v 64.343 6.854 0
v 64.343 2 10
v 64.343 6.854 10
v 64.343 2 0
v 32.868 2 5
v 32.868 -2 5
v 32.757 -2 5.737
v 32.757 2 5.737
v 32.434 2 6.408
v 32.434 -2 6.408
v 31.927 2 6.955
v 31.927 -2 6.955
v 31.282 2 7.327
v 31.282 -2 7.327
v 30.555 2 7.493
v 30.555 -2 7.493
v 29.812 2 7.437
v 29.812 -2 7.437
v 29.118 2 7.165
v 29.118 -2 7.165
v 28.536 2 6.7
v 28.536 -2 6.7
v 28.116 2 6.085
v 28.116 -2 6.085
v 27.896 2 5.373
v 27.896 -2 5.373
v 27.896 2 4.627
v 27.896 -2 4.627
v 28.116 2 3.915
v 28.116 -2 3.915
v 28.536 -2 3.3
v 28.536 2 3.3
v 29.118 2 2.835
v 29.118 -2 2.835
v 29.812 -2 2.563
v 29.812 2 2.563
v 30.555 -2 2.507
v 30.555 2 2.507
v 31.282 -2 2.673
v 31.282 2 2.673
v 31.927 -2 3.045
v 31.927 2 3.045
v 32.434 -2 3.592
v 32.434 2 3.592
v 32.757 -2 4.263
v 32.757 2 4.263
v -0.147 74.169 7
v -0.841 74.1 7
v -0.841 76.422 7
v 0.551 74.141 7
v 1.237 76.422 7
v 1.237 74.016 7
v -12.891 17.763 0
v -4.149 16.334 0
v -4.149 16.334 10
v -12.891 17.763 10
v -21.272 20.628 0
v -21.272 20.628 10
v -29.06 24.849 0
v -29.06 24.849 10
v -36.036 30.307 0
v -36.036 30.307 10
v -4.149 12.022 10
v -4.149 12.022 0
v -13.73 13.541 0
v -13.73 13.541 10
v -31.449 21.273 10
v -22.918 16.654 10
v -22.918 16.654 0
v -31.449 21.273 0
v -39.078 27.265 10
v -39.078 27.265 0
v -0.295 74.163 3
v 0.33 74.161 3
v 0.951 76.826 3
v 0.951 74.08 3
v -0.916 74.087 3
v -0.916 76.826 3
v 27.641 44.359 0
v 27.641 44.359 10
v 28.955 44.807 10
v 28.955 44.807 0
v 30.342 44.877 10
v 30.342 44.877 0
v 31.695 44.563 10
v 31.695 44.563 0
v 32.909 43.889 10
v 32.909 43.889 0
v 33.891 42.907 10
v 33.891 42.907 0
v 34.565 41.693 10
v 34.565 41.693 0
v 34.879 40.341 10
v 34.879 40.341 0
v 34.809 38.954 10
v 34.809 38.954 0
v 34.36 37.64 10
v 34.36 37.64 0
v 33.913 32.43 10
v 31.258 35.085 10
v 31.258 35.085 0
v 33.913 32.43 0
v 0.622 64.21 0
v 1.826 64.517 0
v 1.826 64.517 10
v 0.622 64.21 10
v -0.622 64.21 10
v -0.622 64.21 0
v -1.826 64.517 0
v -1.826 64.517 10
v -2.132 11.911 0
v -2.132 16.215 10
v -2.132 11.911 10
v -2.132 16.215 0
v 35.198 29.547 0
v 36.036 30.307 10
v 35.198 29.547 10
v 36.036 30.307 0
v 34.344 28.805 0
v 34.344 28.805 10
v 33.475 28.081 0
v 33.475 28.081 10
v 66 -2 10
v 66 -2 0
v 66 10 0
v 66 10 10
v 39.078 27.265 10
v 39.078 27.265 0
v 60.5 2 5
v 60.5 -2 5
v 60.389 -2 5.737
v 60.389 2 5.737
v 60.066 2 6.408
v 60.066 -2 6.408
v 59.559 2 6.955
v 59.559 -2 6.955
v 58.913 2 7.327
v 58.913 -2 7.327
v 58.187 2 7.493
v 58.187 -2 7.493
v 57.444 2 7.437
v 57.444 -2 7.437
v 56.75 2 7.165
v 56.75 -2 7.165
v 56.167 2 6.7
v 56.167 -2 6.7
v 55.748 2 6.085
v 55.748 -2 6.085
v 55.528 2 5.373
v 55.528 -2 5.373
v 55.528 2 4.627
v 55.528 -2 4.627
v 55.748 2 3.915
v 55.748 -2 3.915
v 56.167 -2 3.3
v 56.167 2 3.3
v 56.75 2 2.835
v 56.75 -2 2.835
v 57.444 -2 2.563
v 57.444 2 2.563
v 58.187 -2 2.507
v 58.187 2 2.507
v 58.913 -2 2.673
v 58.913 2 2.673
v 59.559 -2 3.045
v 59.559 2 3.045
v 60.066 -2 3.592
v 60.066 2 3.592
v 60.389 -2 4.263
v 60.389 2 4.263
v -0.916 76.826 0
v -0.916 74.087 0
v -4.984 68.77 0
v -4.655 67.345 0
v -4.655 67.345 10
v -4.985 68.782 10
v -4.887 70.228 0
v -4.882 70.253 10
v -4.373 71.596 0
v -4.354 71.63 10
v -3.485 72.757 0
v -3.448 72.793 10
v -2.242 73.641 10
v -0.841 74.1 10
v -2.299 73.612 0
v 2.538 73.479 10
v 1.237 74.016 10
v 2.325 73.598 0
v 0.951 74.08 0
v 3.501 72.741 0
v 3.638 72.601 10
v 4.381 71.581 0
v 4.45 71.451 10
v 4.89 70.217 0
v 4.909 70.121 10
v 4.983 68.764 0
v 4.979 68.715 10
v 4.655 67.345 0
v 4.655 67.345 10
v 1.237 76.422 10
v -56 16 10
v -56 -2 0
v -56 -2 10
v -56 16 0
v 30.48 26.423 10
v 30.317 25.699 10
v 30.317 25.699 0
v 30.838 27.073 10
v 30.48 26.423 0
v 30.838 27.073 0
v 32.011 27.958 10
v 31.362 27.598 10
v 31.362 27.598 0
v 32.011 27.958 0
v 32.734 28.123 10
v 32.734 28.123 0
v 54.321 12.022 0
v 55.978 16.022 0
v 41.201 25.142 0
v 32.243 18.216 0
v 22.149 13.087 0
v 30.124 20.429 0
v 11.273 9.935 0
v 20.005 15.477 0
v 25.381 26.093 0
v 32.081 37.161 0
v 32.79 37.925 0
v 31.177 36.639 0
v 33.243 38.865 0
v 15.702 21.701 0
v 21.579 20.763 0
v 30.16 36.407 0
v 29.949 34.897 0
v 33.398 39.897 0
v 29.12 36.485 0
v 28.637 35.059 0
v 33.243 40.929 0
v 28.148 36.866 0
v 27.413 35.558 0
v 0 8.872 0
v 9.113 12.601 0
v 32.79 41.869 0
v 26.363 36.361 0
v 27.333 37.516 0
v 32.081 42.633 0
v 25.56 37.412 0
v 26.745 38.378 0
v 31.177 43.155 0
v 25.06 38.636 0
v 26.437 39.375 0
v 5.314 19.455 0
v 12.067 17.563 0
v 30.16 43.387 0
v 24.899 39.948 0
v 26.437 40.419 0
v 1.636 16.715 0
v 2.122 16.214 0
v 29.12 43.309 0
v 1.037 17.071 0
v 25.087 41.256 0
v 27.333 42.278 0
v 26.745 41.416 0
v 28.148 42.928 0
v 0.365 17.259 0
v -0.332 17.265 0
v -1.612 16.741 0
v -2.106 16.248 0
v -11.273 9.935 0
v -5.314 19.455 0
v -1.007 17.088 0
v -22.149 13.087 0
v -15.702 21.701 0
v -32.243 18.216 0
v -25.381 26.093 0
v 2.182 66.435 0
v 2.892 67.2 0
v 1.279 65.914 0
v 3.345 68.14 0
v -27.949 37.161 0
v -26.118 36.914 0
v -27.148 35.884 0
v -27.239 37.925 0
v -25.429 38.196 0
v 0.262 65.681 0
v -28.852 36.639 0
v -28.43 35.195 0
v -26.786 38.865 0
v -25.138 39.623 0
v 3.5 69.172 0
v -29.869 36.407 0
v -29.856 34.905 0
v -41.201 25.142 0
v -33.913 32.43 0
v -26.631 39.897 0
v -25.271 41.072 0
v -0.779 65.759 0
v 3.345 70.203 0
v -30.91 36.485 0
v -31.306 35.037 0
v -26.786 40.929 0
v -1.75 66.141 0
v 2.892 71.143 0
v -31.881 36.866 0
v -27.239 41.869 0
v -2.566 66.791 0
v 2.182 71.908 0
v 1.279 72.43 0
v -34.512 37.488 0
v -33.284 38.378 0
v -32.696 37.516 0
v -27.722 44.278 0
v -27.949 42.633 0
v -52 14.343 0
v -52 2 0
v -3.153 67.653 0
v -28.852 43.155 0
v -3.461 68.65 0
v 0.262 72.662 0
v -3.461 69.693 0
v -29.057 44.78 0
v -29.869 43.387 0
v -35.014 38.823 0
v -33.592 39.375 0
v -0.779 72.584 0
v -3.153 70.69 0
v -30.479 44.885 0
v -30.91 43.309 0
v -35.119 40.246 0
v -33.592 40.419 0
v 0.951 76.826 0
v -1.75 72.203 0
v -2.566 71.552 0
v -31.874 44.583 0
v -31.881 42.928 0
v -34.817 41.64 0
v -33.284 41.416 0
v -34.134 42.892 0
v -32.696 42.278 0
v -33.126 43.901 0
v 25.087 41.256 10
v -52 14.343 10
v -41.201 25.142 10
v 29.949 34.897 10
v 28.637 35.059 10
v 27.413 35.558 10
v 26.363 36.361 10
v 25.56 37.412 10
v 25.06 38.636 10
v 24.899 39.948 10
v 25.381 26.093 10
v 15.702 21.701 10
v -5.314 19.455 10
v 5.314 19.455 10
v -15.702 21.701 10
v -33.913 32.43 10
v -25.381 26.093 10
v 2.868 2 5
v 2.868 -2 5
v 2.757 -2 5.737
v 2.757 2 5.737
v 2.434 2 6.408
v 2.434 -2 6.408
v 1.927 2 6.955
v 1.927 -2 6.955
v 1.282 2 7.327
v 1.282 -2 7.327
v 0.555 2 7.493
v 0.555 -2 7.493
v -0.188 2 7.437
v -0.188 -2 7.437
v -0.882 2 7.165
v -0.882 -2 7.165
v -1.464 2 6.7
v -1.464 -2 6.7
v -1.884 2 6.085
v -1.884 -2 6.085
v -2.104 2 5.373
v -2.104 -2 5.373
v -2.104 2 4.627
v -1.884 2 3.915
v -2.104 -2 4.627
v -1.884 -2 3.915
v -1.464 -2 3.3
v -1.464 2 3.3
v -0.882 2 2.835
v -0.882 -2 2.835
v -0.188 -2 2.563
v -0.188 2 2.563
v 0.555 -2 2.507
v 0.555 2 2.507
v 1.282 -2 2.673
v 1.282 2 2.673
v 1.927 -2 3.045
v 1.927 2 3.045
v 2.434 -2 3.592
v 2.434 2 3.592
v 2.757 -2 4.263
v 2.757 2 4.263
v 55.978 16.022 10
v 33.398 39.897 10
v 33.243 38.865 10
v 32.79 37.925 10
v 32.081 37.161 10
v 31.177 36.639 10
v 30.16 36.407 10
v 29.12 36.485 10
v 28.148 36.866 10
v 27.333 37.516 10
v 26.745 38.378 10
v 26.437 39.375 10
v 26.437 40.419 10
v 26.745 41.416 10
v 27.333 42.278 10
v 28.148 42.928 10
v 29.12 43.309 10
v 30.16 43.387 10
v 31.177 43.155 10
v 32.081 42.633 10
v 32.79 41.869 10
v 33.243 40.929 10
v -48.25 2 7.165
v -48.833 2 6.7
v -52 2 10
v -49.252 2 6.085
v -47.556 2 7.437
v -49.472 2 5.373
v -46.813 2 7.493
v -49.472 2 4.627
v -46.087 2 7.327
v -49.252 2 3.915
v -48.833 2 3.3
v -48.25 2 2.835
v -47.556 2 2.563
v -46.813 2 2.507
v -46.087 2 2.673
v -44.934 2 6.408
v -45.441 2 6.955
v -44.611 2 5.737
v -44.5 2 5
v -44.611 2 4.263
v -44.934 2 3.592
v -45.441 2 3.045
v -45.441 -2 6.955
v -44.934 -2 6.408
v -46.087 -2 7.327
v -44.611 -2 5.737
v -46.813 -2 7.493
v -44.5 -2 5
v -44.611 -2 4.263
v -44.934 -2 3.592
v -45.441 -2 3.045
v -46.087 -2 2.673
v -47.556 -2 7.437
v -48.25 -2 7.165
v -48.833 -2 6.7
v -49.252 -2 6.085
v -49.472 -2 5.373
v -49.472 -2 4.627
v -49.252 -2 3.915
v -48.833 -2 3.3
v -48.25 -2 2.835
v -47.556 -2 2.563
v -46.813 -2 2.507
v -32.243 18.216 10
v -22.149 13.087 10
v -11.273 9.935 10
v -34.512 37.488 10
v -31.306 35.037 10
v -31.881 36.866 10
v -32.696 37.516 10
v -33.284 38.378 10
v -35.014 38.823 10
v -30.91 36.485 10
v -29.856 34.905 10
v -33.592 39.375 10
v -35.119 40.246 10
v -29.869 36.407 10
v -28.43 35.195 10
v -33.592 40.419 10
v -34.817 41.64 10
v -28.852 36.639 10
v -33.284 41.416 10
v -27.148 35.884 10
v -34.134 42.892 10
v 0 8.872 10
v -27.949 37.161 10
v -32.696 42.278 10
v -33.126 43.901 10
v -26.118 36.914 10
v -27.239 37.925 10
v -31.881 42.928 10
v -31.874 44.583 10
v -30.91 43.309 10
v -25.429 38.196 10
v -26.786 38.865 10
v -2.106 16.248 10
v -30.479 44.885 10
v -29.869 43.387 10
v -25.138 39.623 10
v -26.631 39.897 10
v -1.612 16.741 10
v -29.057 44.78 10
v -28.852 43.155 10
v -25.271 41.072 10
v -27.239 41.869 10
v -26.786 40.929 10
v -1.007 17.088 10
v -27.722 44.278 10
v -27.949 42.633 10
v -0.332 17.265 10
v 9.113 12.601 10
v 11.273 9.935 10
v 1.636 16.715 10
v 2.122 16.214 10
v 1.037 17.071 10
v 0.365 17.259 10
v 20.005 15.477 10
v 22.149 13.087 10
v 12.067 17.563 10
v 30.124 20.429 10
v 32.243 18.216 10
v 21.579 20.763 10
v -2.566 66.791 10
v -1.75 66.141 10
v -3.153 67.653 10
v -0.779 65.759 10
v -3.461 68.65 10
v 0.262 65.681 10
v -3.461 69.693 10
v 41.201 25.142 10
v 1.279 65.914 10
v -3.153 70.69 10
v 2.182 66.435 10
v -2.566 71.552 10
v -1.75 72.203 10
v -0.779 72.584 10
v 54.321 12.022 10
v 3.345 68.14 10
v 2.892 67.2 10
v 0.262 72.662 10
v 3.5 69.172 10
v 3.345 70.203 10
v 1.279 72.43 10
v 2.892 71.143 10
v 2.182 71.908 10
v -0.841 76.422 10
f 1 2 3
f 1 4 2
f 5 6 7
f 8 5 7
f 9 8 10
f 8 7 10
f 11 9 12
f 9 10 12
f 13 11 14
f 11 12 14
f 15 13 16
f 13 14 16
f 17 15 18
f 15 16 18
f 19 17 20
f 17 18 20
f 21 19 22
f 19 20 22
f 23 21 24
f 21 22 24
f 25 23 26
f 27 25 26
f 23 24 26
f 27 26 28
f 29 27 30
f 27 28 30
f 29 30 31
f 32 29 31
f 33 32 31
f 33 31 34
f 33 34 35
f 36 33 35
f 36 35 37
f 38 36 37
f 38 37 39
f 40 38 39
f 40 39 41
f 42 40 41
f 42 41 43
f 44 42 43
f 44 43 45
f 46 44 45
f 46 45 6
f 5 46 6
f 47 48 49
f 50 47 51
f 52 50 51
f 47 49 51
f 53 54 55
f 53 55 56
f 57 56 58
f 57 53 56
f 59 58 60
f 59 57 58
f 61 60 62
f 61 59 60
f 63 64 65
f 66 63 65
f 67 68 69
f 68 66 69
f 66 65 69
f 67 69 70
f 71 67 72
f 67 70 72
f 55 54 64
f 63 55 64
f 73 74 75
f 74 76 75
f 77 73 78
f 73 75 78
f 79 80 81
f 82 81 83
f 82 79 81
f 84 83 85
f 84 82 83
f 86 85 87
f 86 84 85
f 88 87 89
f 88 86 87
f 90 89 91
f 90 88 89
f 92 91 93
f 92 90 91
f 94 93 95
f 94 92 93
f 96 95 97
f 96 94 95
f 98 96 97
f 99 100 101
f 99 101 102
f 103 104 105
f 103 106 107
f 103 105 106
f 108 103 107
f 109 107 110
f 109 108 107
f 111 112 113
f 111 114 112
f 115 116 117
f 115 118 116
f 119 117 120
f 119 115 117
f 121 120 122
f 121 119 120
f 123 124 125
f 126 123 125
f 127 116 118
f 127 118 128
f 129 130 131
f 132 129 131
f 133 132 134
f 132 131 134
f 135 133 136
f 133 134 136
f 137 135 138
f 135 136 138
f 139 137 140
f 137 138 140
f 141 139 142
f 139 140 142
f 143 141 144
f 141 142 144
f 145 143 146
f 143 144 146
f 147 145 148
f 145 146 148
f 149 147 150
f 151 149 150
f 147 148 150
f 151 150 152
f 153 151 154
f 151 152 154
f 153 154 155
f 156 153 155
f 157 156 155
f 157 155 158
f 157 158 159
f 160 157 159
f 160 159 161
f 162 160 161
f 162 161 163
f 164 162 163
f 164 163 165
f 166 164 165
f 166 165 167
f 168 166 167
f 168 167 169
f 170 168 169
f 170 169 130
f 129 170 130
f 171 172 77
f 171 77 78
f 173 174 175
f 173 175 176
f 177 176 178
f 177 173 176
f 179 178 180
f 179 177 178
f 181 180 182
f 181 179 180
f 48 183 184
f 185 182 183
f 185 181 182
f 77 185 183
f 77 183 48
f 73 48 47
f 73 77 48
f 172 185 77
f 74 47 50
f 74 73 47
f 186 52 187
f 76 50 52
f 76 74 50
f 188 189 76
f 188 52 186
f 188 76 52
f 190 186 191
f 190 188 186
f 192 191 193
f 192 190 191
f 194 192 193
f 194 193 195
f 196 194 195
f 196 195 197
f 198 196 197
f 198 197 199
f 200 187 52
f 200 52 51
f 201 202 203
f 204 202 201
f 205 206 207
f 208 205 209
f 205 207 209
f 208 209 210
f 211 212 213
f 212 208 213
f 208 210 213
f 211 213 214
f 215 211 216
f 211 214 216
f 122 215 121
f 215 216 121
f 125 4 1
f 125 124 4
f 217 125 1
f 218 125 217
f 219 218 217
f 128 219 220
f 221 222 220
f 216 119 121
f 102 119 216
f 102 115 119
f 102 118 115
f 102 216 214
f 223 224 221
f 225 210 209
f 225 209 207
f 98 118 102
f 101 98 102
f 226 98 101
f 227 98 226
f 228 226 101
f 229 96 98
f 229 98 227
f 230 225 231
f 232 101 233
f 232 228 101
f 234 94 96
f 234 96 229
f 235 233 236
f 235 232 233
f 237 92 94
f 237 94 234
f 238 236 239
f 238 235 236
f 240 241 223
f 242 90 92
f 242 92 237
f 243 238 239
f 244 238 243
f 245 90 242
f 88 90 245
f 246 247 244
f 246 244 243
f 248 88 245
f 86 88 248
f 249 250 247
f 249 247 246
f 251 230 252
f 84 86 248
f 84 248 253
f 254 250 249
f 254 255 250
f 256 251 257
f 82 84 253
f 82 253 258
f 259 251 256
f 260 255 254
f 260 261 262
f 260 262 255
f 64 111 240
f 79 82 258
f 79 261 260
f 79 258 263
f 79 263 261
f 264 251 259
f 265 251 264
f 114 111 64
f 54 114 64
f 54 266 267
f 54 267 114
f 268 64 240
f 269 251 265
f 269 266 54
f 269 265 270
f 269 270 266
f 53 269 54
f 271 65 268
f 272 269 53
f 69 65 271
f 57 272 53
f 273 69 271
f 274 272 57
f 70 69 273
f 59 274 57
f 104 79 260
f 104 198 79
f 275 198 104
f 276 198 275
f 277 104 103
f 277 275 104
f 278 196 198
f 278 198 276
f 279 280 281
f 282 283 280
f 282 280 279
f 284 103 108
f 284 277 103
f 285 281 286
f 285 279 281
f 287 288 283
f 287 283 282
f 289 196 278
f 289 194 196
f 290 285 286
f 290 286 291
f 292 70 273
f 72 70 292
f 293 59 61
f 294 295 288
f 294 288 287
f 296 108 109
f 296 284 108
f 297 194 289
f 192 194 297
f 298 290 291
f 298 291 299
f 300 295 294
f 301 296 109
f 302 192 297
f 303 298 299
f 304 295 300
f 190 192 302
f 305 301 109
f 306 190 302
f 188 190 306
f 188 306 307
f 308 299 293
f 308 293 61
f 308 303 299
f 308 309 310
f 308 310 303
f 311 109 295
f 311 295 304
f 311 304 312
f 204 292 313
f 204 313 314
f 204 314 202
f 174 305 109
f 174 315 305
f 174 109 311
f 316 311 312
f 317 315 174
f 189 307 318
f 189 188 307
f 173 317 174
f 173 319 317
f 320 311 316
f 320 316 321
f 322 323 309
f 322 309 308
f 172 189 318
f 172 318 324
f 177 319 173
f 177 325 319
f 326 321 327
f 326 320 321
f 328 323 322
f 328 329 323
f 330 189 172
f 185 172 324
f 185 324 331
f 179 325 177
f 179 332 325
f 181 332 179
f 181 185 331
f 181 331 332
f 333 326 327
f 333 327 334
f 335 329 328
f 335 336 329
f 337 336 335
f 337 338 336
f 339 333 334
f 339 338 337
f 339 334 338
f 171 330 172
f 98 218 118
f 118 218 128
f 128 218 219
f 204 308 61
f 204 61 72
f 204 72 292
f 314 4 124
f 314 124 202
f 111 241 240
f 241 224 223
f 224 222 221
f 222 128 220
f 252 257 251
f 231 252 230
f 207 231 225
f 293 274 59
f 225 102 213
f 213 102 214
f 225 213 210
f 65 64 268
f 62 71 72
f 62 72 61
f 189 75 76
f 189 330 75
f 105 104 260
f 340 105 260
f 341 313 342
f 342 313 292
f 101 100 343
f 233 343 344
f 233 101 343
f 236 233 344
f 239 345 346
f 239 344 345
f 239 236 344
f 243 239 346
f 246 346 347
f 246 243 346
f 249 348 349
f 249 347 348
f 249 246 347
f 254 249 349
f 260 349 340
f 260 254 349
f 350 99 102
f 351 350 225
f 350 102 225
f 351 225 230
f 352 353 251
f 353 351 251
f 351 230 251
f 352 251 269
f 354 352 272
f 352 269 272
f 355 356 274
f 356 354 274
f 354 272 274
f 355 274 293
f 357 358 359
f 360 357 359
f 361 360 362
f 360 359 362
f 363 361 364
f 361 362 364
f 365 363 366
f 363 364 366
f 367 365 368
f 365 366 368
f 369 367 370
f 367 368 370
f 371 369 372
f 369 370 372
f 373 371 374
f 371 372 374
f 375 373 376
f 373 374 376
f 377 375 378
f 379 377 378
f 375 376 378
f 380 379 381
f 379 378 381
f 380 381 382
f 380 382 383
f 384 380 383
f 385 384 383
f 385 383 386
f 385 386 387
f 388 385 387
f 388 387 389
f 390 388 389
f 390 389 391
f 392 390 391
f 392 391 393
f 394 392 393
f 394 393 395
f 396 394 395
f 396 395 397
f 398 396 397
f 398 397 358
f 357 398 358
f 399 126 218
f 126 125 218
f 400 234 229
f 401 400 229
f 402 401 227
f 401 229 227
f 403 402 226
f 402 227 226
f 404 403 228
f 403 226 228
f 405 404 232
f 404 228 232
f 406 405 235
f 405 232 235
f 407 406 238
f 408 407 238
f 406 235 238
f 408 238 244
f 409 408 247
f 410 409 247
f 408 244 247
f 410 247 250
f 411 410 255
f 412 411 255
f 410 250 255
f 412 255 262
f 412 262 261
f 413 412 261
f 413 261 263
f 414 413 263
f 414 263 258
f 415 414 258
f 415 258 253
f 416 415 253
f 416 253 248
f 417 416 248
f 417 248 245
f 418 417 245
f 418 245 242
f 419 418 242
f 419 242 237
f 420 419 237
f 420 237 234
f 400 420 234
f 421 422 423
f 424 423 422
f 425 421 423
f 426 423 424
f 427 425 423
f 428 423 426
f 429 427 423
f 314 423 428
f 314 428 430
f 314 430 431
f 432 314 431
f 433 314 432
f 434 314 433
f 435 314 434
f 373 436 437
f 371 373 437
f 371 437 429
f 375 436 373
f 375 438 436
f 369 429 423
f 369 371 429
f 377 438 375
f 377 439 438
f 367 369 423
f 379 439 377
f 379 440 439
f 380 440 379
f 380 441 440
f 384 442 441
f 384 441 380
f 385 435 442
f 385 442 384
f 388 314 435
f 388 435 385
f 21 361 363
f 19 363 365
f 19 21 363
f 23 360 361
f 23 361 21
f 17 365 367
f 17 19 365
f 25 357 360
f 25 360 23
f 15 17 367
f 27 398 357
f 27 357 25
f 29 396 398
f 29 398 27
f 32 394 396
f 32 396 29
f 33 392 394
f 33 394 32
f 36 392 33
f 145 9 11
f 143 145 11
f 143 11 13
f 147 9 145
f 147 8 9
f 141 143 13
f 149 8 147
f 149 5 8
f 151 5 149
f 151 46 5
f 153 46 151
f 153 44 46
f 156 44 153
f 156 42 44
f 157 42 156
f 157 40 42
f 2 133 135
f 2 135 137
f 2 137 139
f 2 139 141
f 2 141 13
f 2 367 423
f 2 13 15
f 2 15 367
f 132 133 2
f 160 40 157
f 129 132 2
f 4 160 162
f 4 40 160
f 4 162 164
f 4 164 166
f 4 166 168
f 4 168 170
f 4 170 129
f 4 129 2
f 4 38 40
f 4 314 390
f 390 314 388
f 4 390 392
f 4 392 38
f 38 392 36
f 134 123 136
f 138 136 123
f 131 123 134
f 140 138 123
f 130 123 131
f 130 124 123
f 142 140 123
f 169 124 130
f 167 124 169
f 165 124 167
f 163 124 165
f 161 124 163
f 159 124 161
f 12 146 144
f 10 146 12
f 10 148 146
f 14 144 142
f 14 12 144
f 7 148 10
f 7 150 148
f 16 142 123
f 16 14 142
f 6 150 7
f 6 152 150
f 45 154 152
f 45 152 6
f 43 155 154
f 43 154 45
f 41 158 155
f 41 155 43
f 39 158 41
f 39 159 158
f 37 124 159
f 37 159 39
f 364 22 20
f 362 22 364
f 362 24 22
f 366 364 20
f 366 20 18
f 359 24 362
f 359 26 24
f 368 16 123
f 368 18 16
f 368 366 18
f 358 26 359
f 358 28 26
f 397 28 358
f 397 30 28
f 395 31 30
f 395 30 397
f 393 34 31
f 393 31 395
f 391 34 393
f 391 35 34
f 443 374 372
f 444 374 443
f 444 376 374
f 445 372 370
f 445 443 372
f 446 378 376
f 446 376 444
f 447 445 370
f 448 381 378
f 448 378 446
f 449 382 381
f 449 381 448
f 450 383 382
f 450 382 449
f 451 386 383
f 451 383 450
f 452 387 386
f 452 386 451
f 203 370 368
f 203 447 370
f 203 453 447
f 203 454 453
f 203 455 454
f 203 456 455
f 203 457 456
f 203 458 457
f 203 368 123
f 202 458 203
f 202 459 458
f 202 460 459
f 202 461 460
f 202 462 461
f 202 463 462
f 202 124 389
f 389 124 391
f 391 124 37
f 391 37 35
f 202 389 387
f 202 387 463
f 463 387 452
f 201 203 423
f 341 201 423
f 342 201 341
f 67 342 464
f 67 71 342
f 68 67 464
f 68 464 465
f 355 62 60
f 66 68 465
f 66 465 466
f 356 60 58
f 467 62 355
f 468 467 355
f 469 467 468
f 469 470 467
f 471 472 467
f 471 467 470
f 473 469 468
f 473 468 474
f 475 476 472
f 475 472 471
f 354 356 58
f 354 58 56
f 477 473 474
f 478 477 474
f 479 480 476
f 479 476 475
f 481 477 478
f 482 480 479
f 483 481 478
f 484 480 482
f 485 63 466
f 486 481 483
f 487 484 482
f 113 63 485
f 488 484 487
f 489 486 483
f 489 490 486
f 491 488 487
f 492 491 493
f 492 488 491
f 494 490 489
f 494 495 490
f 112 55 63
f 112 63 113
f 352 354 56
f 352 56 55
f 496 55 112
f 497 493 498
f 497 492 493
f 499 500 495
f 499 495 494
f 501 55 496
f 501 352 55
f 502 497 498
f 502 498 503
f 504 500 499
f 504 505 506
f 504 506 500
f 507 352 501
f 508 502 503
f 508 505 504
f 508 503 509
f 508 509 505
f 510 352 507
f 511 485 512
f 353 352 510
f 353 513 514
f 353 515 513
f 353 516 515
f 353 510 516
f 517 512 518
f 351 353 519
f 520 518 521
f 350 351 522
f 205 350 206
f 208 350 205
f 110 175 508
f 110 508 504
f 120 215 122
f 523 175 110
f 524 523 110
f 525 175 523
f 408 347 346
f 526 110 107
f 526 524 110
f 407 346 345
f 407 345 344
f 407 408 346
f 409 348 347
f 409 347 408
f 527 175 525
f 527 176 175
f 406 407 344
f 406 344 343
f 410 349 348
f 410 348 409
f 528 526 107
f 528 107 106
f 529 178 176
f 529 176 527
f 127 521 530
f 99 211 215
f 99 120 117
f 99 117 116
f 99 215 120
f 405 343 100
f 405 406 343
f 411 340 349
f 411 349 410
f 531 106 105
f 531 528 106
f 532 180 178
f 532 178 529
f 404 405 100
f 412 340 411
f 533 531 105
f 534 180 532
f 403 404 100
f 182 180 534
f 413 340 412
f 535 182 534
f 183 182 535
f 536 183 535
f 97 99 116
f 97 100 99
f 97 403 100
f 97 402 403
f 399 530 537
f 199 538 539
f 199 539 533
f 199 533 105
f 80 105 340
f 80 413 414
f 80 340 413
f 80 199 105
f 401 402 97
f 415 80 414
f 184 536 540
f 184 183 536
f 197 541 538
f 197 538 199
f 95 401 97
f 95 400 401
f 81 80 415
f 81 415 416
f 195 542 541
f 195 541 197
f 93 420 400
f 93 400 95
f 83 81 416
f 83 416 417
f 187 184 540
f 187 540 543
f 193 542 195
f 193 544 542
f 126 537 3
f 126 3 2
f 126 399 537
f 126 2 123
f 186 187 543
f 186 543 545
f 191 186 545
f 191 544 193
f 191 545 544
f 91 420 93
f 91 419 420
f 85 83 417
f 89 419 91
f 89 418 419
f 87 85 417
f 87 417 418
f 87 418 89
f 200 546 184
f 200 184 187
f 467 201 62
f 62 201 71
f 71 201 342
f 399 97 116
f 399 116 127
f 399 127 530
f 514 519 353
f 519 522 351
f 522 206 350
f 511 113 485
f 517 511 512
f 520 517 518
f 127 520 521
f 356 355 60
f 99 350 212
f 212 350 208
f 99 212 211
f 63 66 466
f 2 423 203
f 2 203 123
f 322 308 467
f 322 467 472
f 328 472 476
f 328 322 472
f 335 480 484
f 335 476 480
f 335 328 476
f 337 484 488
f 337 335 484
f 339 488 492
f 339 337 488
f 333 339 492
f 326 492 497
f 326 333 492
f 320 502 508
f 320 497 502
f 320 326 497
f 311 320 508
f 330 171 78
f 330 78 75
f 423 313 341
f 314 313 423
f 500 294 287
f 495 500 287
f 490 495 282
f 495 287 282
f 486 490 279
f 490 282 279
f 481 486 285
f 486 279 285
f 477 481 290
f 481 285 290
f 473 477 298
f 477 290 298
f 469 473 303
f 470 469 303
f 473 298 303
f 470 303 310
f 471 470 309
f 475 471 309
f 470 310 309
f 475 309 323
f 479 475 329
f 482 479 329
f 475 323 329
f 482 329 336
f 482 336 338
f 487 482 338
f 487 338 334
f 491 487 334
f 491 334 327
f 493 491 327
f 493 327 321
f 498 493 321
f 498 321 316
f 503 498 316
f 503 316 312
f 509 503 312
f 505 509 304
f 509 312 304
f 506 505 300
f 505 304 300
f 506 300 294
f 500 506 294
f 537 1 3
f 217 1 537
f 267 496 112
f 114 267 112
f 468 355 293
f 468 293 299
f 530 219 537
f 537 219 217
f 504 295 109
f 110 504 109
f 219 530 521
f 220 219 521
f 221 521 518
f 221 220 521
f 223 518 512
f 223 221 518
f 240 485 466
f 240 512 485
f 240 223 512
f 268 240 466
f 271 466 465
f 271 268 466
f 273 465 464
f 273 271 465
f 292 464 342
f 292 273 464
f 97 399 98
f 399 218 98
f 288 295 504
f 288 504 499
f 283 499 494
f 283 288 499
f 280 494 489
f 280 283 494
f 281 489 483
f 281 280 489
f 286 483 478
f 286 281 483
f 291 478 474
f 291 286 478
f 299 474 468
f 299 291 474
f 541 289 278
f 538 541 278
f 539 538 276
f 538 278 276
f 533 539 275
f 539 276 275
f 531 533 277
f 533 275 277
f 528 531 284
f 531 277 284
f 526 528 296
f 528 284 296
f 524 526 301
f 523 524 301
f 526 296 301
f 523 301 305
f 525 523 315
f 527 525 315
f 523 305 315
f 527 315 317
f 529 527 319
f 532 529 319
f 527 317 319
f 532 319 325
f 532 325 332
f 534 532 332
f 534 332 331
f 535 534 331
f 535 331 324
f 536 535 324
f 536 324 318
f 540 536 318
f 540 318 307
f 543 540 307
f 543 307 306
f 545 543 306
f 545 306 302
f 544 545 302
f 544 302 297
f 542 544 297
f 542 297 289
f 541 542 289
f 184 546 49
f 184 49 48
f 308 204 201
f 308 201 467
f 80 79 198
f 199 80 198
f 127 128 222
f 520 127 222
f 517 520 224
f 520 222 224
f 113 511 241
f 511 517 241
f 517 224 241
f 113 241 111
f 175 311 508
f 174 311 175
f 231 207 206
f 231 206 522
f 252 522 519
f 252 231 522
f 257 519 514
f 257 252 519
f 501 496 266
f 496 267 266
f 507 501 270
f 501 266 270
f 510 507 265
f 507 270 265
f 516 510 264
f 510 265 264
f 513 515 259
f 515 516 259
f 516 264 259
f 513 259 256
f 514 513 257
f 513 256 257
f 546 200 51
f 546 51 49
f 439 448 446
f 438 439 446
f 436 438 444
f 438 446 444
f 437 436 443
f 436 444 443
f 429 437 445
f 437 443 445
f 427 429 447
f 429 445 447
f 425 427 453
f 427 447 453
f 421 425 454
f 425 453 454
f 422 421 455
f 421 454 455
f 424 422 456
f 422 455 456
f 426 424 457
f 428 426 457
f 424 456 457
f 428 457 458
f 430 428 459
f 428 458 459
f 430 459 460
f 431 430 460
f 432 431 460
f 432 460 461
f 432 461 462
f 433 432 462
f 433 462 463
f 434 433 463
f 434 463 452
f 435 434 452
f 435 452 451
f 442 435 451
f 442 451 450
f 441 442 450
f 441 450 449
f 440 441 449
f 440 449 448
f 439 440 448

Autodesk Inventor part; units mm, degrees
ref_plane "YZ Plane" through (0, 0, 0) normal (1, 0, 0) x (0, 1, 0)
ref_plane "XZ Plane" through (0, 0, 0) normal (0, 1, 0) x (-1, 0, 0)
ref_plane "XY Plane" through (0, 0, 0) normal (0, 0, 1) x (1, 0, 0)
sketch "Sketch1" plane through (0, 0, 0) normal (0, 0, 1) x (1, 0, 0)
  line L0 (-70, 2) -> (70, 2)
  line L1 (70, 2) -> (70, -2)
  line L2 (70, -2) -> (-70, -2)
  line L3 (-70, -2) -> (-70, 2)
  line L4 (-70, 2) -> (70, -2) construction
  line L5 (70, 2) -> (-70, -2) construction
  line L6 (-70, 2) -> (44.4369, 116.4369)
  line L7 (-70, 2) -> (91.8383, 2) construction
  line L8 (70, 2) -> (-21.2026, 93.2026)
  line L9 (-64.3431, 2) -> (2.8284, 69.1716)
  line L10 (-2.8284, 69.1716) -> (64.3431, 2)
  circle A0 centre (0, 69.1716) radius 3.5
  circle A1 centre (0, 69.1716) radius 5
  circle A2 centre (-67.6199, 0) radius 3.5
  circle A3 centre (-67.6199, 0) radius 5
  circle A4 centre (69.5355, 2.4645) radius 3.5
  circle A5 centre (69.5355, 2.4645) radius 5
  circle A6 centre (29.8984, 39.897) radius 3.5
  circle A7 centre (29.8984, 39.897) radius 5
  line L11 (27.6414, 44.3586) -> (-27.6414, 44.3586)
  line L12 (-27.6414, 44.3586) -> (-27.6414, 52.2202)
  line L13 (-27.6414, 52.2202) -> (-24.6414, 52.2202)
  line L14 (-24.6414, 52.2202) -> (-24.6414, 47.3586)
  line L15 (27.6414, 44.3586) -> (27.6414, 52.2202)
  line L16 (27.6414, 52.2202) -> (24.6414, 52.2202)
  line L17 (24.6414, 52.2202) -> (24.6414, 47.3586)
  circle A8 centre (0, 69.1716) radius 50
  circle A9 centre (0, 69.1716) radius 53
  circle A10 centre (0, 69.1716) radius 57.3
  circle A11 centre (0, 69.1716) radius 60.3
  arc A12 (2.1548, 16.1686) -> (-2.1058, 16.2485) centre (-0.005, 14.6373) ccw
  arc A13 (33.4747, 28.0809) -> (30.3172, 25.699) centre (32.9561, 25.4847) ccw
  line L18 (-2.1058, 16.2485) -> (-2.1315, 16.2145)
  line L19 (-0.1162, 2) -> (-0.1162, -3.5)
  circle A14 centre (-30.1308, 39.897) radius 3.5
  circle A15 centre (-30.1308, 39.897) radius 5
  line L20 (-70.2324, 2) -> (69.7676, -2) construction
  circle A16 centre (-30.1308, 39.897) radius 3.5
  circle A17 centre (-30.1308, 39.897) radius 5
  line L21 (-56, -2) -> (-56, 16)
  line L22 (-52, 20) -> (-52, -2)
  line L23 (-2.1315, 16.2145) -> (-2.1315, 11.9112)
  line L24 (-4.1487, 16.3342) -> (-4.1487, 12.022)
  line L25 (64.3431, 2) -> (64.3431, -2)
  line L26 (66, -2) -> (66, 13.8793)
  line L27 (66, 10) -> (55.978, 16.022)
  line L28 (66, 6) -> (54.3212, 12.022)
  line L29 (64.3431, 2) -> (64.3431, 6.8543)
  point P0 (0, 0)
  point P1 (1.8262, 64.517)
  point P2 (25.0868, 41.2564)
  point P3 (31.2578, 35.0853)
  point P4 (64.3431, 2)
  point P5 (-1.8262, 64.517)
  point P6 (-4.6546, 67.3454)
  point P7 (-67.0344, 4.9656)
  point P8 (-63.0374, -2)
  point P9 (67.2842, -2)
  point P10 (66, 6)
  point P11 (34.36, 37.64)
  point P12 (4.6546, 67.3454)
  point P13 (-41.2009, 25.1423)
  point P14 (41.2009, 25.1423)
  point P15 (39.0783, 27.2648)
  point P16 (-39.0783, 27.2648)
  point P17 (-36.0358, 30.3074)
  point P18 (36.0358, 30.3074)
  point P19 (33.9128, 32.4303)
  point P20 (-33.9128, 32.4303)
  point P21 (2.1218, 16.2141)
  point P22 (-31.3061, 35.0371)
  point P23 (-25.2709, 41.0722)
  point P24 (-27.7217, 44.2783)
  point P25 (-34.5122, 37.4878)
  point P26 (-56, 7)
  point P27 (-52, 2)
  point P28 (-52, 14.3431)
  point P29 (-56, 10.3431)
  point P30 (-56, 2)
  point P31 (44.0293, 27.9707)
  point P32 (41.2009, 113.2009)
  point P33 (1.8262, 73.8262)
  point P34 (0, 66.3431)
  point P35 (0, 72)
  point P36 (21.9846, 44.3586)
  point P37 (63.9523, 2.3909)
  point P38 (-21.9846, 44.3586)
  point P39 (64.5572, 2)
  point P40 (-1.8262, 73.8262)
  point P41 (-44.0293, 27.9707)
  point P42 (70, -1.78)
  point P43 (-26.636, 39.7071)
  point P44 (-29.941, 36.4021)
  point P45 (36.7413, 35.2587)
  point P46 (38.8642, 33.1358)
  point P47 (41.9067, 30.0933)
  point P48 (64.3431, 2)
  dimension "d14" = 10
  dimension "d16" = 10
  dimension "d0" = 140
  dimension "d1" = 4
  dimension "d2" = 45
  dimension "d3" = 4
  dimension "d6" = 4
  dimension "d7" = 4
  dimension "d8" = 4
  dimension "d9" = 7
  dimension "d10" = 10
  dimension "d11" = 7
  dimension "d12" = 10
  dimension "d13" = 7
  dimension "d15" = 7
  dimension "d17" = 3
  dimension "d18" = 3
  dimension "d21" = 3
  dimension "d22" = 3
  dimension "d23" = 4.3
  dimension "d24" = 100
  dimension "d42" = 4
  dimension "d43" = 14
  dimension "d62" = 4
  dimension "d63" = 4
  dimension "d64" = 4
  dimension "d65" = 8
extrude "Extrusion1" add sketch "Sketch1" along normal blind 10 contours L19 L2 L22 L0 | L0 L25 L2 L19 | L29 L28 A5 L0 | L0 A5 L26 L2 L25 | L22 L2 L21 L0 | L0 L21 L9 L22 | A5 L26 L0 | L0 L26 A5 | L10 A11 L8 L28 | L22 L6 A11 L9 | L9 L21 L6 L22 | L8 L27 L26 | A11 L9 A10 L10 | L10 A10 L8 A11 | A11 L6 A10 L9 | L10 A9 L8 A10 | A10 L6 A9 L9 | A9 A13 A12 L18 L9 A8 L10 | L10 A8 L8 A9 | A10 L24 A9 L23 | A9 L6 A8 L9 | L10 A7 L8 A8 | A8 L6 A15 L9 | A7 L10 A6 | L10 A6 L8 A7 | A15 L6 A14 L9 | L9 A14 A15 | A7 L8 A6 L10 | L10 L11 A7 | L8 A6 A7 | A15 L6 A14 | L10 A1 L8 L11 | A14 L6 A15 L9 | L6 L11 L9 A15 | A1 L8 A0 L6 | L6 A0 L8 A1 | A1 L9 A0 L10 | L10 A0 L8 A1 | L11 L6 A1 L9 | L8 A0 L6 A1 | A1 L6 A0 L9
extrude "Extrusion2" cut sketch "Sketch1" along normal blind 10 contours A9 A13 | L18 A12 A9
sketch "Sketch3" plane through (-70, -2, 0) normal (0, -1, 0) x (1, 0, 0)
  line L0 (134.3431, 0) -> (134.3431, 10) projected
  line L1 (5.6569, 0) -> (5.6569, 10) projected
  circle A0 centre (23, 5) radius 2.5
  circle A1 centre (128, 5) radius 2.5
  line L2 (140, 0) -> (140, 10) projected
  line L3 (14, 10) -> (136, 10) projected
  point P0 (70, 0)
  point P1 (0, 10)
  point P2 (133.7935, 10)
  point P3 (18, 10)
  dimension "d34" = 5
  dimension "d35" = 5
  dimension "d36" = 105
  dimension "d37" = 12
  dimension "d38" = 5
  dimension "d39" = 5
extrude "Extrusion4" cut sketch "Sketch3" against normal up to surface (4 mm away)
sketch "Sketch6" plane through (0, 0, 10) normal (0, 0, 1) x (1, 0, 0)
  line L0 (-0.8413, 73.4692) -> (1.2373, 73.4692)
  line L1 (1.2373, 73.4692) -> (1.2373, 76.4217)
  line L2 (1.2373, 76.4217) -> (-0.8413, 76.4217)
  line L3 (-0.8413, 76.4217) -> (-0.8413, 73.4692)
  point P0 (0, 0)
extrude "Extrusion7" add sketch "Sketch6" against normal blind 3
sketch "Sketch4" plane through (0, 0, 0) normal (0, 0, -1) x (-1, 0, 0)
  circle A0 centre (0, 69.1716) radius 3.5 projected
  arc A1 (-4.6546, 67.3454) -> (-1.8262, 64.517) centre (0, 69.1716) ccw projected
  line L0 (-0.9508, 73.5061) -> (0.9164, 73.5061)
  line L1 (0.9164, 73.5061) -> (0.9164, 76.8255)
  line L2 (0.9164, 76.8255) -> (-0.9508, 76.8255)
  line L3 (-0.9508, 76.8255) -> (-0.9508, 73.5061)
  point P0 (0, 0)
  point P1 (3.5355, 65.136)
  point P2 (4.6546, 67.3454)
  point P3 (3.5355, 65.636)
  point P4 (3.5355, 65.636)
  point P5 (1.8262, 64.517)
  point P6 (-3.4452, 68.5548)
  point P7 (-0.6168, 65.7263)
extrude "Extrusion5" add sketch "Sketch4" against normal blind 3 contours L3 L2 L1 L0
sketch "Sketch5" plane through (-56, -2, 0) normal (0, -1, 0) x (1, 0, 0)
  circle A0 centre (56.3685, 5) radius 2.5
  circle A1 centre (86.3685, 5) radius 2.5
  line L0 (0, 10) -> (122, 10) projected
  line L1 (53.8685, 0) -> (53.8685, 10) projected
  point P0 (56, 0)
  point P1 (119.7935, 10)
  point P2 (-14, 10)
  point P3 (126, 10)
  point P4 (4, 10)
  dimension "d52" = 5
  dimension "d53" = 5
  dimension "d54" = 5
  dimension "d55" = 0
  dimension "d56" = 30
  dimension "d57" = 2.5
extrude "Extrusion6" cut sketch "Sketch5" against normal up to surface (4 mm away)
properties part number "BigCageP2"
